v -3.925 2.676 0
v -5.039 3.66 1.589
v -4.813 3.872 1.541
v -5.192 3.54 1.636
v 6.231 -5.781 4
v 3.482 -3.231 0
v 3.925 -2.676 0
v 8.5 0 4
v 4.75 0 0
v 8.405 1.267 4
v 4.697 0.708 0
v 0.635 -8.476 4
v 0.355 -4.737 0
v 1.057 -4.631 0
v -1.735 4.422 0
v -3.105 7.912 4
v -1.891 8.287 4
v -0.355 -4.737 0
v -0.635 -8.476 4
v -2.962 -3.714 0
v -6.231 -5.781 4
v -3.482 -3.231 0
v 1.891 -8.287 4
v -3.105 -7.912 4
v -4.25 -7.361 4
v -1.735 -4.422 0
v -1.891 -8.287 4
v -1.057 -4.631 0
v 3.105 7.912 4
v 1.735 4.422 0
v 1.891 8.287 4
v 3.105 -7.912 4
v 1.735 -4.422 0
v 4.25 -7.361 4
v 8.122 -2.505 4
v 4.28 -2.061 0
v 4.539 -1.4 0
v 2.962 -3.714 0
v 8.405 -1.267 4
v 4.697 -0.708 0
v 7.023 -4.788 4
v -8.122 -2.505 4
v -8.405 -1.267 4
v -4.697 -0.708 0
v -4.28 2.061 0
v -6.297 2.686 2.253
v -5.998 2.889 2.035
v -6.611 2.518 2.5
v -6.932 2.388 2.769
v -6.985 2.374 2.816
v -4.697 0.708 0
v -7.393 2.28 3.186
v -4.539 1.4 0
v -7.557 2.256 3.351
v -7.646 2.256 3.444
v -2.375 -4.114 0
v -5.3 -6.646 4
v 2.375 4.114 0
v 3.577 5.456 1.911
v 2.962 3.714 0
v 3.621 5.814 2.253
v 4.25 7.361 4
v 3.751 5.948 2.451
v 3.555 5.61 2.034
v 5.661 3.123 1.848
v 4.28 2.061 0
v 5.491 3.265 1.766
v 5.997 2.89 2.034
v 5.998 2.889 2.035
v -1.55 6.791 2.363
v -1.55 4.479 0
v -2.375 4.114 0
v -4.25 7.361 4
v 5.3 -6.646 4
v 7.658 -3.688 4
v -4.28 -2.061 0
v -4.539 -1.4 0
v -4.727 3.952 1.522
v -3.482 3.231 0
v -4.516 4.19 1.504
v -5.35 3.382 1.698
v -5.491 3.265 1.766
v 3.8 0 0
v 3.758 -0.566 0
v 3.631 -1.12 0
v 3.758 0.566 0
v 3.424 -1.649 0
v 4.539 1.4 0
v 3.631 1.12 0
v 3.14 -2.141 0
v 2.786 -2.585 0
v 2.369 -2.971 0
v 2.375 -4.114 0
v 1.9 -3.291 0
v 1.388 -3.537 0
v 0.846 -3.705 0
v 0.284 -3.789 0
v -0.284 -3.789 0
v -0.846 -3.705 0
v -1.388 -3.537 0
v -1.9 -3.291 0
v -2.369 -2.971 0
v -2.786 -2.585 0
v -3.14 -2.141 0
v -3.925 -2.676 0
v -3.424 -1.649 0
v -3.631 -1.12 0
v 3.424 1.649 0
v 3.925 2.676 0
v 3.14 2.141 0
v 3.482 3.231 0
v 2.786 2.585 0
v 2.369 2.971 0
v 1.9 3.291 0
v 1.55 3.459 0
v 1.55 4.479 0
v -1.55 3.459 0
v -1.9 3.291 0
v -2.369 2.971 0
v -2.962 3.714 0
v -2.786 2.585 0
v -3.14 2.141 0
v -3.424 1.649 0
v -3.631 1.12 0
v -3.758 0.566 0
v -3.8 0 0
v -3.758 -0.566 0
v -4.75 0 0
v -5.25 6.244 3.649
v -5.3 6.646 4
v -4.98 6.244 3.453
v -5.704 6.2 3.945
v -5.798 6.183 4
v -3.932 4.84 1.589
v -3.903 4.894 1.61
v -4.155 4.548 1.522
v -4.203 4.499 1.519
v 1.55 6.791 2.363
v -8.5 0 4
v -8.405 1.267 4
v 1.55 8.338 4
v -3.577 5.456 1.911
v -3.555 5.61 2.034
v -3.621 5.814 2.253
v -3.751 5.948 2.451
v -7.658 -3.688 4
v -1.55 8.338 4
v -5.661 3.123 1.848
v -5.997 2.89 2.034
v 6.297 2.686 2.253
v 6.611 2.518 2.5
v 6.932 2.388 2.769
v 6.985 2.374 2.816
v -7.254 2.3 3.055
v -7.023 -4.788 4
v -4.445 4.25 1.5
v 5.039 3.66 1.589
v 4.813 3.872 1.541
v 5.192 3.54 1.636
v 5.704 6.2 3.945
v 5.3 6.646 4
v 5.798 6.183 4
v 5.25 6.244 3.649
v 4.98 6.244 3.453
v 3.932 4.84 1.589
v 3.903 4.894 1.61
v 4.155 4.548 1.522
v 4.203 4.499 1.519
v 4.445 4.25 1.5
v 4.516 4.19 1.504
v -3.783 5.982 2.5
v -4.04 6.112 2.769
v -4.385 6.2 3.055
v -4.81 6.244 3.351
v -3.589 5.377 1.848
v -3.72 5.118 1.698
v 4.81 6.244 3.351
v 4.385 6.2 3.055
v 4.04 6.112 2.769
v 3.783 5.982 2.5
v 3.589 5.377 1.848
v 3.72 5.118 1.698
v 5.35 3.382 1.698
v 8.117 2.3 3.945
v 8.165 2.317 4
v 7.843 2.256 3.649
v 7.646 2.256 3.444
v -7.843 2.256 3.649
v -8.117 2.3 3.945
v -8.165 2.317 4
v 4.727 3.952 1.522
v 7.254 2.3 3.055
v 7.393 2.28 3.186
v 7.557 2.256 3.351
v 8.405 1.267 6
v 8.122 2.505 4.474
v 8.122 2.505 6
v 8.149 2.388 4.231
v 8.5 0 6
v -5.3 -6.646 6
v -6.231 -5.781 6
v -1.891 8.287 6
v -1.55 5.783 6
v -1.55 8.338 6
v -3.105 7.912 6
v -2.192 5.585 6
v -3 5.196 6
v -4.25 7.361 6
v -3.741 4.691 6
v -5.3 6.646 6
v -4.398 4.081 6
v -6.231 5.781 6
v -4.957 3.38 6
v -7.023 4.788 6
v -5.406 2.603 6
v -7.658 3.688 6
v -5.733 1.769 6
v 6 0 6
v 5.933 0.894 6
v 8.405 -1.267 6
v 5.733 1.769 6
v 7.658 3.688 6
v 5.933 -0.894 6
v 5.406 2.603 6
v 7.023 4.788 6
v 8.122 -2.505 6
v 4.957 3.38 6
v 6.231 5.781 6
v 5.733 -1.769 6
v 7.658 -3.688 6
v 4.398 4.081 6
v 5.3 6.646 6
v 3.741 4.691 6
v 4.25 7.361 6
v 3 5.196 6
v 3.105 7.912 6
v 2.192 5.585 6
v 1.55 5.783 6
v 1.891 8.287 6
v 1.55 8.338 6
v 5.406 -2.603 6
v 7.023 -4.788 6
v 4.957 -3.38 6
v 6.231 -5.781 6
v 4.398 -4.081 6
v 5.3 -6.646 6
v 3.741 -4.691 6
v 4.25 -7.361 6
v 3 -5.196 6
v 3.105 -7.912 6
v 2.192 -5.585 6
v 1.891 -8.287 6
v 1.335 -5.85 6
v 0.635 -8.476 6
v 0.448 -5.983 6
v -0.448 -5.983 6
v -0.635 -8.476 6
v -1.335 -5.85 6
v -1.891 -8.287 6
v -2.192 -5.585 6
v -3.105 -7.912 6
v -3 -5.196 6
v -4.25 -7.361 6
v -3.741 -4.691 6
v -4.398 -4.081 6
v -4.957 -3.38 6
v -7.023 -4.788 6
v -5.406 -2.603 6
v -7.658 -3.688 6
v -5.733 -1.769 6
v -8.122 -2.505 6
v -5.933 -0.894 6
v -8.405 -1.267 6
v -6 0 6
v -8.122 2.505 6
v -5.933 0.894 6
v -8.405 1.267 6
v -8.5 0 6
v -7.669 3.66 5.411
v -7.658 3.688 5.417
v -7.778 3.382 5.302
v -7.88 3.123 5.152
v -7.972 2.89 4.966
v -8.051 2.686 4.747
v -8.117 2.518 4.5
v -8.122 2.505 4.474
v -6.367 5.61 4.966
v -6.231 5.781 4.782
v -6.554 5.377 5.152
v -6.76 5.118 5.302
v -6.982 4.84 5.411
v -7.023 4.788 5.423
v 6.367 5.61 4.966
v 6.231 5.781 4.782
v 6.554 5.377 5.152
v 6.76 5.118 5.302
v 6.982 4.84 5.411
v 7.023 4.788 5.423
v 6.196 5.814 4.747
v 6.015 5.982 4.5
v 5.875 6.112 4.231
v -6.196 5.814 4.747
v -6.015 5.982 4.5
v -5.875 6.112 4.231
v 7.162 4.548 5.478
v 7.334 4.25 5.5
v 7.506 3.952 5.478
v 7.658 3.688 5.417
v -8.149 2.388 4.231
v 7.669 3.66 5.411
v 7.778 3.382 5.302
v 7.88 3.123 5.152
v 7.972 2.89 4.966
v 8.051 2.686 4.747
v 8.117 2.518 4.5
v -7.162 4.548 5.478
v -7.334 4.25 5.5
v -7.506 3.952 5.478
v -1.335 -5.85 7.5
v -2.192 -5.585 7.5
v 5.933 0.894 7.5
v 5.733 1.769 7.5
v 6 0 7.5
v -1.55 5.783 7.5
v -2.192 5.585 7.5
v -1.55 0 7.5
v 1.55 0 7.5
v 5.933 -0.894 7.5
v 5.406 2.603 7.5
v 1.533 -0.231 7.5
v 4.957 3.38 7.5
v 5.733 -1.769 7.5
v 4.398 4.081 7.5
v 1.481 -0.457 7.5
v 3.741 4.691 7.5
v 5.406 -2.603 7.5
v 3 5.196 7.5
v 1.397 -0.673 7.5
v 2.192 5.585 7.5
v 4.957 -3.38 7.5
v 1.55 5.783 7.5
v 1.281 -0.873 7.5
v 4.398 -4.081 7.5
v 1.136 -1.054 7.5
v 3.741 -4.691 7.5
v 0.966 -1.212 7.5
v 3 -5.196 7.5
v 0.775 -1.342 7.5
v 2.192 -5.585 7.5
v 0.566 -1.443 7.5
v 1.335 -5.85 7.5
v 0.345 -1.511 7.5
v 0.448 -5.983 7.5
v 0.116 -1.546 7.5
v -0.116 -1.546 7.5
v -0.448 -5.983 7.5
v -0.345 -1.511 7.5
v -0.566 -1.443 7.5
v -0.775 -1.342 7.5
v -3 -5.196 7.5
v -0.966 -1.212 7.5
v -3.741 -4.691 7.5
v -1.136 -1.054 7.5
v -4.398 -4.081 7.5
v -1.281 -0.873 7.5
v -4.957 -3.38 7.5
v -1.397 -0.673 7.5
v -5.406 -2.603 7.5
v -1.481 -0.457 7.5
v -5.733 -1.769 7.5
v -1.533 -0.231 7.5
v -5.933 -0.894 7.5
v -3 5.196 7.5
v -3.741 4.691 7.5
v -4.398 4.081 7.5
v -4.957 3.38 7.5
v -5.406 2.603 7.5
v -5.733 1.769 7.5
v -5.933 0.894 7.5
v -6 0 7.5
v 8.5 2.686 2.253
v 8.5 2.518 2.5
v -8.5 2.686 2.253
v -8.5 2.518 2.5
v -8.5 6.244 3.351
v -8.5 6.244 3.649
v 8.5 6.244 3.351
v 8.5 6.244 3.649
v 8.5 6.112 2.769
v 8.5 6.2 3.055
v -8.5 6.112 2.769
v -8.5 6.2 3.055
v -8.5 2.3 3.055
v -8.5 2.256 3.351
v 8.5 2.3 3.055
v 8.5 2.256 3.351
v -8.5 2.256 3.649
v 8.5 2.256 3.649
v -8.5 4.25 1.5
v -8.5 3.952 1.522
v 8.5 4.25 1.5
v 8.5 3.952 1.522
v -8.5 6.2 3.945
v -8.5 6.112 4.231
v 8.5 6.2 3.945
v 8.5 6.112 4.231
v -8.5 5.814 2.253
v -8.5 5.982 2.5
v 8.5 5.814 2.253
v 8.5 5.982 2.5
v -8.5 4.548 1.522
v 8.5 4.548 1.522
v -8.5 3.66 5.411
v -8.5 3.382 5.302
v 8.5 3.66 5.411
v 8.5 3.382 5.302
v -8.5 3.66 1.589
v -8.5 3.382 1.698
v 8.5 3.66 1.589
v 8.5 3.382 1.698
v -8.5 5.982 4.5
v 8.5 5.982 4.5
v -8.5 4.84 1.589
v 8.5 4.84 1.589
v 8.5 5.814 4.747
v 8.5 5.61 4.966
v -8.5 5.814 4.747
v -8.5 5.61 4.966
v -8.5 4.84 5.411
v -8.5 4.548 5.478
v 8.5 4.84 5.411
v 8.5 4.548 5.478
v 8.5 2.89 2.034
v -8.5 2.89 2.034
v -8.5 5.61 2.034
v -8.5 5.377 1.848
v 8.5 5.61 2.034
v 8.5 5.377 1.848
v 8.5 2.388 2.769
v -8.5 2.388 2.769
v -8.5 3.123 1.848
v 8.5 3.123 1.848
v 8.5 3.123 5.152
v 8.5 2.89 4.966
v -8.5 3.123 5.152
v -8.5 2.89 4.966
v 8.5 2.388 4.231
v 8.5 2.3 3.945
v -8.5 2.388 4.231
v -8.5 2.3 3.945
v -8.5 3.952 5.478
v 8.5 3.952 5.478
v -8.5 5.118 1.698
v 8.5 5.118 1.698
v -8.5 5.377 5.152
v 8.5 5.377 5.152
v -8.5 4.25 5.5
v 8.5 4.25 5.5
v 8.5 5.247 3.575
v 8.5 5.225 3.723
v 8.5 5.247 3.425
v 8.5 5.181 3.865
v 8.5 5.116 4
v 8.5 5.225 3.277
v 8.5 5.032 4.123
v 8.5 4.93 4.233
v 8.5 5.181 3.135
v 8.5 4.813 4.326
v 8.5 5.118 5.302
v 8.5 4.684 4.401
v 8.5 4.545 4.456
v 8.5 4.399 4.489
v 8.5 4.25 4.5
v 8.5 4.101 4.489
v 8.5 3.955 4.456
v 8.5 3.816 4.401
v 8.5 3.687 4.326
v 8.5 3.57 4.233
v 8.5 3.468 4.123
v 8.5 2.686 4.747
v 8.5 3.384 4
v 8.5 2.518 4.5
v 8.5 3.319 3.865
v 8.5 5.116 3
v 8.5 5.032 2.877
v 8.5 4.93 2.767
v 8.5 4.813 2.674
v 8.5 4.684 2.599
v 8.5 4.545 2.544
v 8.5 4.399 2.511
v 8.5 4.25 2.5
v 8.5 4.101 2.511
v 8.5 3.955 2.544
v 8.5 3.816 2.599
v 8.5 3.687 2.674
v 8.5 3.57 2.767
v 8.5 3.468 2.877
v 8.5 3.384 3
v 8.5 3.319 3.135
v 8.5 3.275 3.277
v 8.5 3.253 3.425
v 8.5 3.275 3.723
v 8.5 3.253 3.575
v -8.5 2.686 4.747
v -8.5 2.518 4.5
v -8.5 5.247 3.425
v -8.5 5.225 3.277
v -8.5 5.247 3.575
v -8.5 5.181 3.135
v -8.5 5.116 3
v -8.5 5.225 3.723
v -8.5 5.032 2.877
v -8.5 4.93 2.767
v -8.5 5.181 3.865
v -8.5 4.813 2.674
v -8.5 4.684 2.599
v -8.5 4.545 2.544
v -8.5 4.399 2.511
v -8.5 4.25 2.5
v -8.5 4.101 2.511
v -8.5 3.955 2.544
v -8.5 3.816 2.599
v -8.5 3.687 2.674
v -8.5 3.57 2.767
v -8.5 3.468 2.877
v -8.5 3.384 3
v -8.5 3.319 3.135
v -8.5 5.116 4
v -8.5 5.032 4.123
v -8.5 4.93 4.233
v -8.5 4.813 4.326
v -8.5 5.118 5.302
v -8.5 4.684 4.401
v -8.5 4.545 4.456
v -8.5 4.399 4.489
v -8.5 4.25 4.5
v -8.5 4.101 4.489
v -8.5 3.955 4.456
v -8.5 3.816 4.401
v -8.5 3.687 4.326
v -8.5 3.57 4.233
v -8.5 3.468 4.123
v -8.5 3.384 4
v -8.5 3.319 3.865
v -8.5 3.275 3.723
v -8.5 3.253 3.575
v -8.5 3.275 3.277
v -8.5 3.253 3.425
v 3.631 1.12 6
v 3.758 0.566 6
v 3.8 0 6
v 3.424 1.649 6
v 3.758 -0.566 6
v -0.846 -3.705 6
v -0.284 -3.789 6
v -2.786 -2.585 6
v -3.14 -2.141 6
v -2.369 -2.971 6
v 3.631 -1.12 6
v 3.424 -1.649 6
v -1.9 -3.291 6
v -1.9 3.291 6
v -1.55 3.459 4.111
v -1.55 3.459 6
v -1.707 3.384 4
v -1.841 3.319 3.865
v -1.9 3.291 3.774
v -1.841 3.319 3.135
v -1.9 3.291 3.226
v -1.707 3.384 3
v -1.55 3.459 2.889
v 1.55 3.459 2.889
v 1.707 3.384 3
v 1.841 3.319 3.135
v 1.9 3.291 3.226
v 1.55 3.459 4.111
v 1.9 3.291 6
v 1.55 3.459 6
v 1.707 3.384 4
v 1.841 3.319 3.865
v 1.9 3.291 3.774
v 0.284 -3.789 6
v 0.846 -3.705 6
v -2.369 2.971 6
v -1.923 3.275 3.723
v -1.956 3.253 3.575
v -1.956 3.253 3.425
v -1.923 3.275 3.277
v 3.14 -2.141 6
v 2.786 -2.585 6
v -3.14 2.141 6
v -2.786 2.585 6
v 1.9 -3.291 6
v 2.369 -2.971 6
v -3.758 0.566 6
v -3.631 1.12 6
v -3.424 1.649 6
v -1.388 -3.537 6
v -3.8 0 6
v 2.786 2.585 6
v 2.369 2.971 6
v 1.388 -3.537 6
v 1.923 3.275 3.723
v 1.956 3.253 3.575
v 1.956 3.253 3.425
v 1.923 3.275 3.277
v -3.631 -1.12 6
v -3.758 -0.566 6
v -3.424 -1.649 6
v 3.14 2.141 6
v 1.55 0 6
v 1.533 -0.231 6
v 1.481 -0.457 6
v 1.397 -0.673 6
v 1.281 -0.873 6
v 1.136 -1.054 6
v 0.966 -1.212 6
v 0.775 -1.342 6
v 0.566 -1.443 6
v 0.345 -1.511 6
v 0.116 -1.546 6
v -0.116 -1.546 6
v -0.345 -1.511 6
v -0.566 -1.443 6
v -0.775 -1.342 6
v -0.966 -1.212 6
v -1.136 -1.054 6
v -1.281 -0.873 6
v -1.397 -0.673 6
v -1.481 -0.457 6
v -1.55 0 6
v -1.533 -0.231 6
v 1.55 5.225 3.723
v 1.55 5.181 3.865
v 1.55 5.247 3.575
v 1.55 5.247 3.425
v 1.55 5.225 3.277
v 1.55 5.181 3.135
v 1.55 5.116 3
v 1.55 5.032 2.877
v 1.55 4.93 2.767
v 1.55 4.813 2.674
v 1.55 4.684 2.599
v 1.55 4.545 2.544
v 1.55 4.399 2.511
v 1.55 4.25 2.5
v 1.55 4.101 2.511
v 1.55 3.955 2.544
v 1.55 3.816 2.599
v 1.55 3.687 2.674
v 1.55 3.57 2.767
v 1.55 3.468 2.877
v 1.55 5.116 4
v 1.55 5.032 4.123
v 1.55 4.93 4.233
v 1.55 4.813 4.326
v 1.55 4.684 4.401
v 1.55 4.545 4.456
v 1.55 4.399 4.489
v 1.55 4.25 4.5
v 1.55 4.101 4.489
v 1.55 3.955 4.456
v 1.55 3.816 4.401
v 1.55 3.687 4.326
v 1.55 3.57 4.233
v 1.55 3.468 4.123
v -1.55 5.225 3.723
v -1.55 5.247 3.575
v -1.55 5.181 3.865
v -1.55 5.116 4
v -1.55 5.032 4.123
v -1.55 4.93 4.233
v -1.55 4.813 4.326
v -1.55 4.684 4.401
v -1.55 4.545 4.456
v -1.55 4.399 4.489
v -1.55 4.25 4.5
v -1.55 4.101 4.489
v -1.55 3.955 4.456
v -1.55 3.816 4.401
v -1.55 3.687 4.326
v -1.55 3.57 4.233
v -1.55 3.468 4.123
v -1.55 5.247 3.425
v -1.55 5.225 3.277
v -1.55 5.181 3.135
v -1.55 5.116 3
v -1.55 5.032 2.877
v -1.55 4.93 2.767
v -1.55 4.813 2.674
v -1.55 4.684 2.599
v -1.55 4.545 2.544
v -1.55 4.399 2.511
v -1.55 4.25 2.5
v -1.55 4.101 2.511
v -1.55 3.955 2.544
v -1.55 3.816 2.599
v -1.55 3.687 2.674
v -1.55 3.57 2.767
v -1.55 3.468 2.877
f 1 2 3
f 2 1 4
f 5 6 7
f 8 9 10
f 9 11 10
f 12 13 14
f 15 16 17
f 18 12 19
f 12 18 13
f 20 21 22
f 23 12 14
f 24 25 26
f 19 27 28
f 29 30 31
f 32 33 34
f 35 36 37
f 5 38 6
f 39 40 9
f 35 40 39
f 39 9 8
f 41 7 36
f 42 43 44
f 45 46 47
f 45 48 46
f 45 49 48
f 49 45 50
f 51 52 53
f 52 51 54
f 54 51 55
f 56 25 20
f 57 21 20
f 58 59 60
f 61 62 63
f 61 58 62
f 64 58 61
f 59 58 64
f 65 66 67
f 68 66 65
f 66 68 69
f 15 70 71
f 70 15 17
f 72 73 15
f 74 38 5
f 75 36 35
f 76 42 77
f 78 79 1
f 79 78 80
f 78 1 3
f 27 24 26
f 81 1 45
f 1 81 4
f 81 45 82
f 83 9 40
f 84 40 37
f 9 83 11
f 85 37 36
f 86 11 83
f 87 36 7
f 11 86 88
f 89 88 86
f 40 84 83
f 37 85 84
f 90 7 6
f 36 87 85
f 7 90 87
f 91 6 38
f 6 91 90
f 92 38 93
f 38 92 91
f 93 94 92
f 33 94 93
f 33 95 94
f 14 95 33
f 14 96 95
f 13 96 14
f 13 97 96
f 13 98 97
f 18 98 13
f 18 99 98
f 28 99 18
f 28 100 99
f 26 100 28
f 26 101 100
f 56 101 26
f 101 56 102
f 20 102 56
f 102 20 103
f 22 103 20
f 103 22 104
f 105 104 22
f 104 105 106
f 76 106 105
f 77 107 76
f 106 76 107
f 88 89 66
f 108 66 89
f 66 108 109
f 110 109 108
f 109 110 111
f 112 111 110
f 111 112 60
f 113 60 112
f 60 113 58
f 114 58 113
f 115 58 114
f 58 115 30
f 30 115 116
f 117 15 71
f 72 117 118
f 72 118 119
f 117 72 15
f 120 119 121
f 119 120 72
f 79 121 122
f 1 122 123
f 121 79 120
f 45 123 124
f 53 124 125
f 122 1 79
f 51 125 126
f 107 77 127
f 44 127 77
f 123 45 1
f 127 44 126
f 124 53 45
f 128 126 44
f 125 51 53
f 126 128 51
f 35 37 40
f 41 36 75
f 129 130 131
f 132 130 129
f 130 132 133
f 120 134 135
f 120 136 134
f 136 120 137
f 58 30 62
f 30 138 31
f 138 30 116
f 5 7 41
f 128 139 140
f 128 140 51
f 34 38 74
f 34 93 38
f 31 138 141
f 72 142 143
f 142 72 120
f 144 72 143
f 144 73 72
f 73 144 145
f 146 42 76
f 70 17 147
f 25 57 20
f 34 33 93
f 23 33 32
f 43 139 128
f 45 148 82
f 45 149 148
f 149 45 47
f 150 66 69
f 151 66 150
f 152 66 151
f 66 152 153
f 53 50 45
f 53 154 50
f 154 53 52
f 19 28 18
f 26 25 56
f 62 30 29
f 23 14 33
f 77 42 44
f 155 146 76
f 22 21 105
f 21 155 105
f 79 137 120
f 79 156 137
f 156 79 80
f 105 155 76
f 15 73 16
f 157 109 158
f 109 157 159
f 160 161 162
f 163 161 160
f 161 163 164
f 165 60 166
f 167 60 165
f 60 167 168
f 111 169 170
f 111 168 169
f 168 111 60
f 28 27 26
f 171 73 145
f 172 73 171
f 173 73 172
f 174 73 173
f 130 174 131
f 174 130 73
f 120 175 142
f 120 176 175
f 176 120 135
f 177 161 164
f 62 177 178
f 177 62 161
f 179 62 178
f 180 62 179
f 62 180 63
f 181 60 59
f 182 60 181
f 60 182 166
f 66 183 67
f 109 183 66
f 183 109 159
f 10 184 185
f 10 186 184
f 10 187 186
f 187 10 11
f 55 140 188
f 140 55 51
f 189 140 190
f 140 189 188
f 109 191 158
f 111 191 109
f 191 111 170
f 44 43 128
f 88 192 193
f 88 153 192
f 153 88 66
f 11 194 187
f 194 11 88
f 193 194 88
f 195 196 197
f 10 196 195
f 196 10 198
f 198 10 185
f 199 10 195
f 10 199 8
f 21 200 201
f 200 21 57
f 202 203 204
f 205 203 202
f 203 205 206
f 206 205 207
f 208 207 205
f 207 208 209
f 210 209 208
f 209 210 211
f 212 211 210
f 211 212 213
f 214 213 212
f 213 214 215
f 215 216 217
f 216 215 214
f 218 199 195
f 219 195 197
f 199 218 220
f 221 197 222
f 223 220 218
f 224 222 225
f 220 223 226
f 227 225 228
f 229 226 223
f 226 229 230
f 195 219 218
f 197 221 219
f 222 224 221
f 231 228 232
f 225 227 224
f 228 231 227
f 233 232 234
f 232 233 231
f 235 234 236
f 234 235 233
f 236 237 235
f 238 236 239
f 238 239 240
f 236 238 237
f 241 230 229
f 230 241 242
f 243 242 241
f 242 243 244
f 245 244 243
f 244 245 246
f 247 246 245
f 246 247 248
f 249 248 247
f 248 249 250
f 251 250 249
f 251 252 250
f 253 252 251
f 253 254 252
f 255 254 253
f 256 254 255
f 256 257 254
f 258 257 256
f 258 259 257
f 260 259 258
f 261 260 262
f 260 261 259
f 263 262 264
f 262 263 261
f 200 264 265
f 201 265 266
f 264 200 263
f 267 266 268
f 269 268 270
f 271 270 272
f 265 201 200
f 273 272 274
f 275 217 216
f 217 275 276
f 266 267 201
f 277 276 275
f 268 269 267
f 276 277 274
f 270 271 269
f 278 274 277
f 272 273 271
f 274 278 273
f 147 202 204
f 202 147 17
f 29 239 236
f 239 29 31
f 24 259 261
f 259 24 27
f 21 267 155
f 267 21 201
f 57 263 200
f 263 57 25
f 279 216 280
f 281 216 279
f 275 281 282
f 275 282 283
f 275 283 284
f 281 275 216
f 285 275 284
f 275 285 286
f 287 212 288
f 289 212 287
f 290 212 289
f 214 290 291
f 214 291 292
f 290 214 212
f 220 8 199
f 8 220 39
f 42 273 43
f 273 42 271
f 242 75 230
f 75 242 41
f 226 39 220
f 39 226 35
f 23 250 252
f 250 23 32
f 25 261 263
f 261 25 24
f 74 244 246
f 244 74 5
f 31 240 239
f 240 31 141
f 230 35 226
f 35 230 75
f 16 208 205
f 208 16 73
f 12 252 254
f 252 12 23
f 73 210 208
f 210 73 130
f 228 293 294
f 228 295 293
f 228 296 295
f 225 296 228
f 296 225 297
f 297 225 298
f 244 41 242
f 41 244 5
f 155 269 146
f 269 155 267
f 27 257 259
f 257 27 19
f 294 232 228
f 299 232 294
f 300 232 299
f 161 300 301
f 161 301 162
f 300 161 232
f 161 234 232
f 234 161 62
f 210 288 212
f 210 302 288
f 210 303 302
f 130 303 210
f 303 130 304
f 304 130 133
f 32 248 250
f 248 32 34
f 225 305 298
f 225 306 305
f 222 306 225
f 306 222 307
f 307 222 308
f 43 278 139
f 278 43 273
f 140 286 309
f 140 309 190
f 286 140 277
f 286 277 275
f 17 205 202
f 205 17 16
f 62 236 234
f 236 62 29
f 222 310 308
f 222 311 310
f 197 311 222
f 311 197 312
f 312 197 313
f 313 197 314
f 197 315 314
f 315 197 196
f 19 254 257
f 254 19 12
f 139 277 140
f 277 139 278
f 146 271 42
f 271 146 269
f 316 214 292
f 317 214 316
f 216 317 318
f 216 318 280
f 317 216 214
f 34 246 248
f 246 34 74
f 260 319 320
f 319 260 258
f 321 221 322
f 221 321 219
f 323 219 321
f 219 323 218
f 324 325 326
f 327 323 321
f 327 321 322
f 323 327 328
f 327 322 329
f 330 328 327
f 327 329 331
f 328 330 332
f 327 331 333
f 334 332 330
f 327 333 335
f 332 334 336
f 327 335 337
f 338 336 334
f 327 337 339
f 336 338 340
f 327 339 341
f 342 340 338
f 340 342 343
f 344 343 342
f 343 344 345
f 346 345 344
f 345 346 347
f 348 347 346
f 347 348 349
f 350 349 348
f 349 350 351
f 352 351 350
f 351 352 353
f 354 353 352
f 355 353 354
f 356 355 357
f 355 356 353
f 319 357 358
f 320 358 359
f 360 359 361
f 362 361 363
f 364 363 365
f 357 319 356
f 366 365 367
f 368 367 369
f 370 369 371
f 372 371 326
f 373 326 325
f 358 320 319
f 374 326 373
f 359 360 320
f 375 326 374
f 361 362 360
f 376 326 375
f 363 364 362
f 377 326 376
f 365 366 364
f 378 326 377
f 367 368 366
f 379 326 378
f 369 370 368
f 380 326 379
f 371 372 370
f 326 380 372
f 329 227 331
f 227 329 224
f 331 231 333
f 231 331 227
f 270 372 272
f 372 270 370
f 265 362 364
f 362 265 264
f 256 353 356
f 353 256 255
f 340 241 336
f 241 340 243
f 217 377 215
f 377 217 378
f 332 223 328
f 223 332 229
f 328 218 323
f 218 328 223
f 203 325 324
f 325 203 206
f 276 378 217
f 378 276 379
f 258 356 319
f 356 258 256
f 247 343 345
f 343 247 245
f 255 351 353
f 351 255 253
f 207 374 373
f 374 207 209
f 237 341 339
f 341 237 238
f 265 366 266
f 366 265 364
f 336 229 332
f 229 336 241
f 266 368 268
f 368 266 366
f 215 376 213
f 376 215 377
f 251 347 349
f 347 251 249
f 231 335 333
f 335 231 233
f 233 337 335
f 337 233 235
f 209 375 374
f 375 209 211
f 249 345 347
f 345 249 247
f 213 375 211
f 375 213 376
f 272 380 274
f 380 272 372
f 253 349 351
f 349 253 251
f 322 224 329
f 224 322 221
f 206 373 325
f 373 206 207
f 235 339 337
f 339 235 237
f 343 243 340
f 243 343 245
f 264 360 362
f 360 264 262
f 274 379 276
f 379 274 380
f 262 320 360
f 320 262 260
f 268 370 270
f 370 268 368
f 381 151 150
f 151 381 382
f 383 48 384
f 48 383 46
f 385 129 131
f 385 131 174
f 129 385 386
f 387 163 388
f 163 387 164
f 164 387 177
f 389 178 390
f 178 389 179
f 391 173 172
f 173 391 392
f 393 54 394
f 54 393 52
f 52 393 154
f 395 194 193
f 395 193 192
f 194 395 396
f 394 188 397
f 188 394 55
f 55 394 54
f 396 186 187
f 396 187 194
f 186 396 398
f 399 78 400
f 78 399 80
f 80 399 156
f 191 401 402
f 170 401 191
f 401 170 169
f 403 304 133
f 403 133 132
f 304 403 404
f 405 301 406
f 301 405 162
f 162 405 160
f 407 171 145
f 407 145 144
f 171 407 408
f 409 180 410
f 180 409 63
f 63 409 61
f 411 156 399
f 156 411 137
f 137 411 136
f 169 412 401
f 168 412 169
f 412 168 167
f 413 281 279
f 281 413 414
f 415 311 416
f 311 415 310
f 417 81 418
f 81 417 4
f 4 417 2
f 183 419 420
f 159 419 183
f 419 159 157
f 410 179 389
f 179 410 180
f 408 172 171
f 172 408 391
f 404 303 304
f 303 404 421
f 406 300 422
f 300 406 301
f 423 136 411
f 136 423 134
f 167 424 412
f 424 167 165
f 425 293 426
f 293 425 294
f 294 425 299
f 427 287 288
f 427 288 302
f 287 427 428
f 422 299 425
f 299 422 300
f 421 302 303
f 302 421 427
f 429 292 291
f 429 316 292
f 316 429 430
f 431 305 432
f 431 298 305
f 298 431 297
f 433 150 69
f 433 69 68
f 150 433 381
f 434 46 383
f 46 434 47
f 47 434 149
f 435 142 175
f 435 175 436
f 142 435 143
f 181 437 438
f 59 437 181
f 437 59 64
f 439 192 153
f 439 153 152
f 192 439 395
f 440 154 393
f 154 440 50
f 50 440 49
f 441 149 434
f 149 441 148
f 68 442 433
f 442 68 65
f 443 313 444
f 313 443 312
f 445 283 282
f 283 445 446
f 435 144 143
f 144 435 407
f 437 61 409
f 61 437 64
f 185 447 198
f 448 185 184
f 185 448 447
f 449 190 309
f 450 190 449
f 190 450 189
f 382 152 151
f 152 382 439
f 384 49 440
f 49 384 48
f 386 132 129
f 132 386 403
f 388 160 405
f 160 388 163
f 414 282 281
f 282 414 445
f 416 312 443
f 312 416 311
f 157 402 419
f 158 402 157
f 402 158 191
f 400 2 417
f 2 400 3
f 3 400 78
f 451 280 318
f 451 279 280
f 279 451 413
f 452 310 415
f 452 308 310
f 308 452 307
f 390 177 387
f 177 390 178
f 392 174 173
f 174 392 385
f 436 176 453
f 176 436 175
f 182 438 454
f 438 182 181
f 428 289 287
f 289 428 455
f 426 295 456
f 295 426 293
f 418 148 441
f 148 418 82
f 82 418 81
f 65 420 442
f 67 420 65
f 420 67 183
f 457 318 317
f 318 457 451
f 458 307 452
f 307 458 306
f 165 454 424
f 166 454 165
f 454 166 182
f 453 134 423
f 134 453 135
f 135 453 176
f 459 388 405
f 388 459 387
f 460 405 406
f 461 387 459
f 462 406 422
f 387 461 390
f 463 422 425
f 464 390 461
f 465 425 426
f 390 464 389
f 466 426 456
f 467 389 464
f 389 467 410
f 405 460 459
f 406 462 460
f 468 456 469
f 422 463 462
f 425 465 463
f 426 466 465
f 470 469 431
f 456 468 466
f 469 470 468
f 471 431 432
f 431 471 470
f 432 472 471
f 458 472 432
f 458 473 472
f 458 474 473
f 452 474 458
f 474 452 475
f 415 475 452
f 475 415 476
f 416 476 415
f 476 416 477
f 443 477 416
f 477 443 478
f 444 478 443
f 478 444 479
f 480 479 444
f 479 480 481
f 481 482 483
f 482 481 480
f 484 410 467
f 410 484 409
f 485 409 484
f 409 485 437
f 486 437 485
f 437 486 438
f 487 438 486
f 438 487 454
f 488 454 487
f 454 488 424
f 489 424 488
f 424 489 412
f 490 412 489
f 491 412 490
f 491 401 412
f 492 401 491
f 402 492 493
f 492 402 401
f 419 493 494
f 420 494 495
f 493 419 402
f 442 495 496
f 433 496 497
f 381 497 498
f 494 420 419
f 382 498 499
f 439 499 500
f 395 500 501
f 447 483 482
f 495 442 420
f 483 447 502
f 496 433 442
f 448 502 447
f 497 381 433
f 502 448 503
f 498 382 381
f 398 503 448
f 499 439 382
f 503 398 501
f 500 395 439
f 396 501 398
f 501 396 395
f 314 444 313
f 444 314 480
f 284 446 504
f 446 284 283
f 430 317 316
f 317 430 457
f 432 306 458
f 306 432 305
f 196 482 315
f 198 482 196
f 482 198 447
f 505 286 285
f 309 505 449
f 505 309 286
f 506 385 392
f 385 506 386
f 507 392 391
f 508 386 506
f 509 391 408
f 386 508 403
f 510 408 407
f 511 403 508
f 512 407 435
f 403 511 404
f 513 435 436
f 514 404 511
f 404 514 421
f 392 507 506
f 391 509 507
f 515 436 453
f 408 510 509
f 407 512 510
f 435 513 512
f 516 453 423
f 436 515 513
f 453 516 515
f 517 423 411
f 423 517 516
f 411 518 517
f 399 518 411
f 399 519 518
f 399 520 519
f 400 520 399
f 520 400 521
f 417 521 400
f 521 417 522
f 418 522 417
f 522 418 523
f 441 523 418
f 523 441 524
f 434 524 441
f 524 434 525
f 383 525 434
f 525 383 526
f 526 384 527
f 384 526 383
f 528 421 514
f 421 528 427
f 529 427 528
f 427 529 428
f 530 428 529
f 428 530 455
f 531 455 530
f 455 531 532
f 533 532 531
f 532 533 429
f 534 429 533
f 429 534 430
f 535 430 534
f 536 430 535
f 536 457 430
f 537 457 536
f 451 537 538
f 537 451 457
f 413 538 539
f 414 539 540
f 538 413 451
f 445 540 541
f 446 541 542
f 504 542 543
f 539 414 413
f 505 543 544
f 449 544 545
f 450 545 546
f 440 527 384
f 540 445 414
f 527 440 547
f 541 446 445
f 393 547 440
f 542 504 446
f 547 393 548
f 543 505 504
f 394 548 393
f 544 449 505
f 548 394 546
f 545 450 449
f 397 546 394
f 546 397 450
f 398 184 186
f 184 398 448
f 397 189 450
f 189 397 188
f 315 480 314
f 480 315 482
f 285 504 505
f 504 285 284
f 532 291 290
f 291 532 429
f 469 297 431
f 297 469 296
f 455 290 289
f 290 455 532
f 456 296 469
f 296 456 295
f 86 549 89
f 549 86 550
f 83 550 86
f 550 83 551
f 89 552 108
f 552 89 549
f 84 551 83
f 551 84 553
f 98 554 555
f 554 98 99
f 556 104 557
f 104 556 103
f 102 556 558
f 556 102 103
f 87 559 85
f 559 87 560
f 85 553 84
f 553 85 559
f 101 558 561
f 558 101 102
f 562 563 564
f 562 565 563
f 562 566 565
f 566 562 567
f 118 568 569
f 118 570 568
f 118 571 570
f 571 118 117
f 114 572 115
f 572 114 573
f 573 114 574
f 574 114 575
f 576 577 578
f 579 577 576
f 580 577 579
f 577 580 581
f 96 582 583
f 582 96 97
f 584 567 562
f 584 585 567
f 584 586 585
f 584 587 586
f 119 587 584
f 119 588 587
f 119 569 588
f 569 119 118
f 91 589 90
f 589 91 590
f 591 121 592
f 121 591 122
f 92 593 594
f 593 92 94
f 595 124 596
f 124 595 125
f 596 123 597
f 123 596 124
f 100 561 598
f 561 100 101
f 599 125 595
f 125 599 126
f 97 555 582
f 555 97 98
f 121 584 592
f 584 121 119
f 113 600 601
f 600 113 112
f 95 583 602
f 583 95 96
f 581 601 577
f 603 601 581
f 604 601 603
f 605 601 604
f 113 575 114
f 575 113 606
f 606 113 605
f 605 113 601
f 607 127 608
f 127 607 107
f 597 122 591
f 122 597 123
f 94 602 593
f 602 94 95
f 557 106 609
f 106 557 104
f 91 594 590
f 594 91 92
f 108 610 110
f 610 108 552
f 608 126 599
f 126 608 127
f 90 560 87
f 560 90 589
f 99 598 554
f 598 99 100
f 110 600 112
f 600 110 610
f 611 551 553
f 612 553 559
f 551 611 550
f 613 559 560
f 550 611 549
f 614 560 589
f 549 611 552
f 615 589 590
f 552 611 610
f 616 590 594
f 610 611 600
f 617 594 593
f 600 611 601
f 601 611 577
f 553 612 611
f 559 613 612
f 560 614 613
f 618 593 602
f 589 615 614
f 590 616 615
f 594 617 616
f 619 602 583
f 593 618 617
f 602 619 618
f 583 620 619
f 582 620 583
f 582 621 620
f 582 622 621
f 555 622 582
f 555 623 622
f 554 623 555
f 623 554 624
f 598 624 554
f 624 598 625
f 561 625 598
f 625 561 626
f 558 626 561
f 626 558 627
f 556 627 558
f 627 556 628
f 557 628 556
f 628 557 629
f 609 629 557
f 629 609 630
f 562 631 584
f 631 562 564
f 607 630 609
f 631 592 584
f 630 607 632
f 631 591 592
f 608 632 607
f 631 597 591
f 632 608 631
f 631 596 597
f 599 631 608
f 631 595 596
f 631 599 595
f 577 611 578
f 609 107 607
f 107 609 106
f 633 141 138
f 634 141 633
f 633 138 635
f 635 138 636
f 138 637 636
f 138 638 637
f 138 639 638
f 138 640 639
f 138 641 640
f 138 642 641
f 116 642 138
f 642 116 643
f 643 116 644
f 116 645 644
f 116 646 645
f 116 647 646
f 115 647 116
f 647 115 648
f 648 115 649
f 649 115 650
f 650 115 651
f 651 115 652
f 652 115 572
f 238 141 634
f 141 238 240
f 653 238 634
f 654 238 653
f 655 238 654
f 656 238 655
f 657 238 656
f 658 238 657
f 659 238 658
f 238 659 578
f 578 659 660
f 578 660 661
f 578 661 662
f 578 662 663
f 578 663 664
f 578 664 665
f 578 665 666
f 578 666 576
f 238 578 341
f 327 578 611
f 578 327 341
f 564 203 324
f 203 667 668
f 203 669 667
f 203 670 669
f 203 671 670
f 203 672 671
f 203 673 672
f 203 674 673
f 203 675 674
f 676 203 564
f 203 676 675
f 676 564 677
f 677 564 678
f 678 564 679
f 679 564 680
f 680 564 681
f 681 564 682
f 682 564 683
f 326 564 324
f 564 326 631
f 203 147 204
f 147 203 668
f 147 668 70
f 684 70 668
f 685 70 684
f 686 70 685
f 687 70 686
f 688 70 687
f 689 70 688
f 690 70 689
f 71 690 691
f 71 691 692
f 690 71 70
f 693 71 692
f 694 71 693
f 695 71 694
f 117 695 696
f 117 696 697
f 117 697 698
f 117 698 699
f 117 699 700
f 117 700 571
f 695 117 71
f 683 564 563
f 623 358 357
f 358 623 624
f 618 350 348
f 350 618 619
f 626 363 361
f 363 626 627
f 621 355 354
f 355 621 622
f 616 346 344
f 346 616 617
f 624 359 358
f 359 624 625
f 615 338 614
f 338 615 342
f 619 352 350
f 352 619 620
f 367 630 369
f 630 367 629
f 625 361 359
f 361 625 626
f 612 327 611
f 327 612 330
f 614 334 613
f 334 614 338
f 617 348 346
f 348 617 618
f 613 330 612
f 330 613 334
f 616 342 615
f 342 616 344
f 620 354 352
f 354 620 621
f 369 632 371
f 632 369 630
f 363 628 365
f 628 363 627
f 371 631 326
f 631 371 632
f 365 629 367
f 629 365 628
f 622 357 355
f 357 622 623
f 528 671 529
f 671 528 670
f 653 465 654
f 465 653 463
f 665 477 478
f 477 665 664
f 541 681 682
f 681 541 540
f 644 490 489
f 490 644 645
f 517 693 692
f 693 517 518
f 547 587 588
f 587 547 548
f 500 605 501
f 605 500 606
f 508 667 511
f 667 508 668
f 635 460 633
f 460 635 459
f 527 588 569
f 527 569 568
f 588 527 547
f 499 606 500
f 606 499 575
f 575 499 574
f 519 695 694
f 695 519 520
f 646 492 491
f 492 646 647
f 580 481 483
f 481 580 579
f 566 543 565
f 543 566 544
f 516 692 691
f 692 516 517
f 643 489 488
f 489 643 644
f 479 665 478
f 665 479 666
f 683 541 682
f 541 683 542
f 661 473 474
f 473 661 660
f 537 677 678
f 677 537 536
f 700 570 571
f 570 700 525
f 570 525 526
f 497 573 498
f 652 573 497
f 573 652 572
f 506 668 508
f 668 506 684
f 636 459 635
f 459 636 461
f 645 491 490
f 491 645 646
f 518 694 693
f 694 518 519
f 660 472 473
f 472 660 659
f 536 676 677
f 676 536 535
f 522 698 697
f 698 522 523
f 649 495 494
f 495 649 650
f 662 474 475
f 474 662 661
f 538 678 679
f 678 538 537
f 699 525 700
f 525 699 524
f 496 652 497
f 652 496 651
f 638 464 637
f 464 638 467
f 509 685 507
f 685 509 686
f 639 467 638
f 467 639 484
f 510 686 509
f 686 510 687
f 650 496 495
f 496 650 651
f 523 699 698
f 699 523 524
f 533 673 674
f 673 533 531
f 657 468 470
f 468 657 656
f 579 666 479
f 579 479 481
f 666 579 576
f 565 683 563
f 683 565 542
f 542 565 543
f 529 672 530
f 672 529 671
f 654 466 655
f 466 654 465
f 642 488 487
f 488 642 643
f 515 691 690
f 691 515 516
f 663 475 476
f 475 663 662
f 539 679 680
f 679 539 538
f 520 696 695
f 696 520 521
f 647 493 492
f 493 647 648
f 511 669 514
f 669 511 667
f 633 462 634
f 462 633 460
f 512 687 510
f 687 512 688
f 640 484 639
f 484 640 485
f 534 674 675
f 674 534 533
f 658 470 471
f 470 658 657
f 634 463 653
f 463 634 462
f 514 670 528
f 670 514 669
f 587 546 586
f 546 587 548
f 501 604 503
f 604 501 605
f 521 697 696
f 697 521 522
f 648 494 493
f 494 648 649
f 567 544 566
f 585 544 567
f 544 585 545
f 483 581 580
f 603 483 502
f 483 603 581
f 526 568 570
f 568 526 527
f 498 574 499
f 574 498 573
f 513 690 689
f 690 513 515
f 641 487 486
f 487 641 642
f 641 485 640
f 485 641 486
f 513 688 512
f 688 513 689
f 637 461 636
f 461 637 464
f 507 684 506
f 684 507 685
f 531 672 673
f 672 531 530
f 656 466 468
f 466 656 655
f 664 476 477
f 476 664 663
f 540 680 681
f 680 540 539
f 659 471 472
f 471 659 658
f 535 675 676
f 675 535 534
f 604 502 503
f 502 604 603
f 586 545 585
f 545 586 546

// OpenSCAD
/* Tamiya Damper Spring Cup/Retention Disk D5 (Federteller)

   Fits at least CC-01. Probably many other chassis, too.
   
*/

//$fn=23;
$fn=42;
gRodDia=3.1;

 /* front+rear, no screw */
if (0)
cup(7.5, 15+2, 0);

 /* front+rear, with locking screw */
if (1)
cup(7.5, 15+2, 2.0); // M2

module cup(d1, d2, sd)
{
	difference()
	{
		union()
		{
			/* lower cone */
										cylinder(d1=d1+2, d2=d2, h=4.0);
			
			/* spring retention disk */
			translate([0, 0, 4])		cylinder(d=d2, h=2.0); 
			
			/* spring centering disk */
			translate([0, 0, 4+2.0]) 	cylinder(d=d2-2-3, h=1.5); 
			
			/* lock */
			if (sd>0)
			{
				translate([0, d2/2/2, (4+2)-(sd+3)/2])
				rotate([0, 90, 0])
				cylinder(d=sd+2, h=d2/1, center=true);
			}
		}

		/* ball end connector */
		cylinder(d=d1+0.1, h=4+2);
		
		/* insertion dingenskirchens schlitz */ 
		translate([0, 10/2, 0])
		cube([gRodDia, 10, 23], center=true);
		cylinder(d=gRodDia, h=23);
		
		/* room for screw */
		if (sd>0)
		{
				translate([0, d2/2/2, (4+2)-(sd+3)/2])
				rotate([0, 90, 0])
				cylinder(d=sd, h=d2/1, center=true);
		}

	}
}
